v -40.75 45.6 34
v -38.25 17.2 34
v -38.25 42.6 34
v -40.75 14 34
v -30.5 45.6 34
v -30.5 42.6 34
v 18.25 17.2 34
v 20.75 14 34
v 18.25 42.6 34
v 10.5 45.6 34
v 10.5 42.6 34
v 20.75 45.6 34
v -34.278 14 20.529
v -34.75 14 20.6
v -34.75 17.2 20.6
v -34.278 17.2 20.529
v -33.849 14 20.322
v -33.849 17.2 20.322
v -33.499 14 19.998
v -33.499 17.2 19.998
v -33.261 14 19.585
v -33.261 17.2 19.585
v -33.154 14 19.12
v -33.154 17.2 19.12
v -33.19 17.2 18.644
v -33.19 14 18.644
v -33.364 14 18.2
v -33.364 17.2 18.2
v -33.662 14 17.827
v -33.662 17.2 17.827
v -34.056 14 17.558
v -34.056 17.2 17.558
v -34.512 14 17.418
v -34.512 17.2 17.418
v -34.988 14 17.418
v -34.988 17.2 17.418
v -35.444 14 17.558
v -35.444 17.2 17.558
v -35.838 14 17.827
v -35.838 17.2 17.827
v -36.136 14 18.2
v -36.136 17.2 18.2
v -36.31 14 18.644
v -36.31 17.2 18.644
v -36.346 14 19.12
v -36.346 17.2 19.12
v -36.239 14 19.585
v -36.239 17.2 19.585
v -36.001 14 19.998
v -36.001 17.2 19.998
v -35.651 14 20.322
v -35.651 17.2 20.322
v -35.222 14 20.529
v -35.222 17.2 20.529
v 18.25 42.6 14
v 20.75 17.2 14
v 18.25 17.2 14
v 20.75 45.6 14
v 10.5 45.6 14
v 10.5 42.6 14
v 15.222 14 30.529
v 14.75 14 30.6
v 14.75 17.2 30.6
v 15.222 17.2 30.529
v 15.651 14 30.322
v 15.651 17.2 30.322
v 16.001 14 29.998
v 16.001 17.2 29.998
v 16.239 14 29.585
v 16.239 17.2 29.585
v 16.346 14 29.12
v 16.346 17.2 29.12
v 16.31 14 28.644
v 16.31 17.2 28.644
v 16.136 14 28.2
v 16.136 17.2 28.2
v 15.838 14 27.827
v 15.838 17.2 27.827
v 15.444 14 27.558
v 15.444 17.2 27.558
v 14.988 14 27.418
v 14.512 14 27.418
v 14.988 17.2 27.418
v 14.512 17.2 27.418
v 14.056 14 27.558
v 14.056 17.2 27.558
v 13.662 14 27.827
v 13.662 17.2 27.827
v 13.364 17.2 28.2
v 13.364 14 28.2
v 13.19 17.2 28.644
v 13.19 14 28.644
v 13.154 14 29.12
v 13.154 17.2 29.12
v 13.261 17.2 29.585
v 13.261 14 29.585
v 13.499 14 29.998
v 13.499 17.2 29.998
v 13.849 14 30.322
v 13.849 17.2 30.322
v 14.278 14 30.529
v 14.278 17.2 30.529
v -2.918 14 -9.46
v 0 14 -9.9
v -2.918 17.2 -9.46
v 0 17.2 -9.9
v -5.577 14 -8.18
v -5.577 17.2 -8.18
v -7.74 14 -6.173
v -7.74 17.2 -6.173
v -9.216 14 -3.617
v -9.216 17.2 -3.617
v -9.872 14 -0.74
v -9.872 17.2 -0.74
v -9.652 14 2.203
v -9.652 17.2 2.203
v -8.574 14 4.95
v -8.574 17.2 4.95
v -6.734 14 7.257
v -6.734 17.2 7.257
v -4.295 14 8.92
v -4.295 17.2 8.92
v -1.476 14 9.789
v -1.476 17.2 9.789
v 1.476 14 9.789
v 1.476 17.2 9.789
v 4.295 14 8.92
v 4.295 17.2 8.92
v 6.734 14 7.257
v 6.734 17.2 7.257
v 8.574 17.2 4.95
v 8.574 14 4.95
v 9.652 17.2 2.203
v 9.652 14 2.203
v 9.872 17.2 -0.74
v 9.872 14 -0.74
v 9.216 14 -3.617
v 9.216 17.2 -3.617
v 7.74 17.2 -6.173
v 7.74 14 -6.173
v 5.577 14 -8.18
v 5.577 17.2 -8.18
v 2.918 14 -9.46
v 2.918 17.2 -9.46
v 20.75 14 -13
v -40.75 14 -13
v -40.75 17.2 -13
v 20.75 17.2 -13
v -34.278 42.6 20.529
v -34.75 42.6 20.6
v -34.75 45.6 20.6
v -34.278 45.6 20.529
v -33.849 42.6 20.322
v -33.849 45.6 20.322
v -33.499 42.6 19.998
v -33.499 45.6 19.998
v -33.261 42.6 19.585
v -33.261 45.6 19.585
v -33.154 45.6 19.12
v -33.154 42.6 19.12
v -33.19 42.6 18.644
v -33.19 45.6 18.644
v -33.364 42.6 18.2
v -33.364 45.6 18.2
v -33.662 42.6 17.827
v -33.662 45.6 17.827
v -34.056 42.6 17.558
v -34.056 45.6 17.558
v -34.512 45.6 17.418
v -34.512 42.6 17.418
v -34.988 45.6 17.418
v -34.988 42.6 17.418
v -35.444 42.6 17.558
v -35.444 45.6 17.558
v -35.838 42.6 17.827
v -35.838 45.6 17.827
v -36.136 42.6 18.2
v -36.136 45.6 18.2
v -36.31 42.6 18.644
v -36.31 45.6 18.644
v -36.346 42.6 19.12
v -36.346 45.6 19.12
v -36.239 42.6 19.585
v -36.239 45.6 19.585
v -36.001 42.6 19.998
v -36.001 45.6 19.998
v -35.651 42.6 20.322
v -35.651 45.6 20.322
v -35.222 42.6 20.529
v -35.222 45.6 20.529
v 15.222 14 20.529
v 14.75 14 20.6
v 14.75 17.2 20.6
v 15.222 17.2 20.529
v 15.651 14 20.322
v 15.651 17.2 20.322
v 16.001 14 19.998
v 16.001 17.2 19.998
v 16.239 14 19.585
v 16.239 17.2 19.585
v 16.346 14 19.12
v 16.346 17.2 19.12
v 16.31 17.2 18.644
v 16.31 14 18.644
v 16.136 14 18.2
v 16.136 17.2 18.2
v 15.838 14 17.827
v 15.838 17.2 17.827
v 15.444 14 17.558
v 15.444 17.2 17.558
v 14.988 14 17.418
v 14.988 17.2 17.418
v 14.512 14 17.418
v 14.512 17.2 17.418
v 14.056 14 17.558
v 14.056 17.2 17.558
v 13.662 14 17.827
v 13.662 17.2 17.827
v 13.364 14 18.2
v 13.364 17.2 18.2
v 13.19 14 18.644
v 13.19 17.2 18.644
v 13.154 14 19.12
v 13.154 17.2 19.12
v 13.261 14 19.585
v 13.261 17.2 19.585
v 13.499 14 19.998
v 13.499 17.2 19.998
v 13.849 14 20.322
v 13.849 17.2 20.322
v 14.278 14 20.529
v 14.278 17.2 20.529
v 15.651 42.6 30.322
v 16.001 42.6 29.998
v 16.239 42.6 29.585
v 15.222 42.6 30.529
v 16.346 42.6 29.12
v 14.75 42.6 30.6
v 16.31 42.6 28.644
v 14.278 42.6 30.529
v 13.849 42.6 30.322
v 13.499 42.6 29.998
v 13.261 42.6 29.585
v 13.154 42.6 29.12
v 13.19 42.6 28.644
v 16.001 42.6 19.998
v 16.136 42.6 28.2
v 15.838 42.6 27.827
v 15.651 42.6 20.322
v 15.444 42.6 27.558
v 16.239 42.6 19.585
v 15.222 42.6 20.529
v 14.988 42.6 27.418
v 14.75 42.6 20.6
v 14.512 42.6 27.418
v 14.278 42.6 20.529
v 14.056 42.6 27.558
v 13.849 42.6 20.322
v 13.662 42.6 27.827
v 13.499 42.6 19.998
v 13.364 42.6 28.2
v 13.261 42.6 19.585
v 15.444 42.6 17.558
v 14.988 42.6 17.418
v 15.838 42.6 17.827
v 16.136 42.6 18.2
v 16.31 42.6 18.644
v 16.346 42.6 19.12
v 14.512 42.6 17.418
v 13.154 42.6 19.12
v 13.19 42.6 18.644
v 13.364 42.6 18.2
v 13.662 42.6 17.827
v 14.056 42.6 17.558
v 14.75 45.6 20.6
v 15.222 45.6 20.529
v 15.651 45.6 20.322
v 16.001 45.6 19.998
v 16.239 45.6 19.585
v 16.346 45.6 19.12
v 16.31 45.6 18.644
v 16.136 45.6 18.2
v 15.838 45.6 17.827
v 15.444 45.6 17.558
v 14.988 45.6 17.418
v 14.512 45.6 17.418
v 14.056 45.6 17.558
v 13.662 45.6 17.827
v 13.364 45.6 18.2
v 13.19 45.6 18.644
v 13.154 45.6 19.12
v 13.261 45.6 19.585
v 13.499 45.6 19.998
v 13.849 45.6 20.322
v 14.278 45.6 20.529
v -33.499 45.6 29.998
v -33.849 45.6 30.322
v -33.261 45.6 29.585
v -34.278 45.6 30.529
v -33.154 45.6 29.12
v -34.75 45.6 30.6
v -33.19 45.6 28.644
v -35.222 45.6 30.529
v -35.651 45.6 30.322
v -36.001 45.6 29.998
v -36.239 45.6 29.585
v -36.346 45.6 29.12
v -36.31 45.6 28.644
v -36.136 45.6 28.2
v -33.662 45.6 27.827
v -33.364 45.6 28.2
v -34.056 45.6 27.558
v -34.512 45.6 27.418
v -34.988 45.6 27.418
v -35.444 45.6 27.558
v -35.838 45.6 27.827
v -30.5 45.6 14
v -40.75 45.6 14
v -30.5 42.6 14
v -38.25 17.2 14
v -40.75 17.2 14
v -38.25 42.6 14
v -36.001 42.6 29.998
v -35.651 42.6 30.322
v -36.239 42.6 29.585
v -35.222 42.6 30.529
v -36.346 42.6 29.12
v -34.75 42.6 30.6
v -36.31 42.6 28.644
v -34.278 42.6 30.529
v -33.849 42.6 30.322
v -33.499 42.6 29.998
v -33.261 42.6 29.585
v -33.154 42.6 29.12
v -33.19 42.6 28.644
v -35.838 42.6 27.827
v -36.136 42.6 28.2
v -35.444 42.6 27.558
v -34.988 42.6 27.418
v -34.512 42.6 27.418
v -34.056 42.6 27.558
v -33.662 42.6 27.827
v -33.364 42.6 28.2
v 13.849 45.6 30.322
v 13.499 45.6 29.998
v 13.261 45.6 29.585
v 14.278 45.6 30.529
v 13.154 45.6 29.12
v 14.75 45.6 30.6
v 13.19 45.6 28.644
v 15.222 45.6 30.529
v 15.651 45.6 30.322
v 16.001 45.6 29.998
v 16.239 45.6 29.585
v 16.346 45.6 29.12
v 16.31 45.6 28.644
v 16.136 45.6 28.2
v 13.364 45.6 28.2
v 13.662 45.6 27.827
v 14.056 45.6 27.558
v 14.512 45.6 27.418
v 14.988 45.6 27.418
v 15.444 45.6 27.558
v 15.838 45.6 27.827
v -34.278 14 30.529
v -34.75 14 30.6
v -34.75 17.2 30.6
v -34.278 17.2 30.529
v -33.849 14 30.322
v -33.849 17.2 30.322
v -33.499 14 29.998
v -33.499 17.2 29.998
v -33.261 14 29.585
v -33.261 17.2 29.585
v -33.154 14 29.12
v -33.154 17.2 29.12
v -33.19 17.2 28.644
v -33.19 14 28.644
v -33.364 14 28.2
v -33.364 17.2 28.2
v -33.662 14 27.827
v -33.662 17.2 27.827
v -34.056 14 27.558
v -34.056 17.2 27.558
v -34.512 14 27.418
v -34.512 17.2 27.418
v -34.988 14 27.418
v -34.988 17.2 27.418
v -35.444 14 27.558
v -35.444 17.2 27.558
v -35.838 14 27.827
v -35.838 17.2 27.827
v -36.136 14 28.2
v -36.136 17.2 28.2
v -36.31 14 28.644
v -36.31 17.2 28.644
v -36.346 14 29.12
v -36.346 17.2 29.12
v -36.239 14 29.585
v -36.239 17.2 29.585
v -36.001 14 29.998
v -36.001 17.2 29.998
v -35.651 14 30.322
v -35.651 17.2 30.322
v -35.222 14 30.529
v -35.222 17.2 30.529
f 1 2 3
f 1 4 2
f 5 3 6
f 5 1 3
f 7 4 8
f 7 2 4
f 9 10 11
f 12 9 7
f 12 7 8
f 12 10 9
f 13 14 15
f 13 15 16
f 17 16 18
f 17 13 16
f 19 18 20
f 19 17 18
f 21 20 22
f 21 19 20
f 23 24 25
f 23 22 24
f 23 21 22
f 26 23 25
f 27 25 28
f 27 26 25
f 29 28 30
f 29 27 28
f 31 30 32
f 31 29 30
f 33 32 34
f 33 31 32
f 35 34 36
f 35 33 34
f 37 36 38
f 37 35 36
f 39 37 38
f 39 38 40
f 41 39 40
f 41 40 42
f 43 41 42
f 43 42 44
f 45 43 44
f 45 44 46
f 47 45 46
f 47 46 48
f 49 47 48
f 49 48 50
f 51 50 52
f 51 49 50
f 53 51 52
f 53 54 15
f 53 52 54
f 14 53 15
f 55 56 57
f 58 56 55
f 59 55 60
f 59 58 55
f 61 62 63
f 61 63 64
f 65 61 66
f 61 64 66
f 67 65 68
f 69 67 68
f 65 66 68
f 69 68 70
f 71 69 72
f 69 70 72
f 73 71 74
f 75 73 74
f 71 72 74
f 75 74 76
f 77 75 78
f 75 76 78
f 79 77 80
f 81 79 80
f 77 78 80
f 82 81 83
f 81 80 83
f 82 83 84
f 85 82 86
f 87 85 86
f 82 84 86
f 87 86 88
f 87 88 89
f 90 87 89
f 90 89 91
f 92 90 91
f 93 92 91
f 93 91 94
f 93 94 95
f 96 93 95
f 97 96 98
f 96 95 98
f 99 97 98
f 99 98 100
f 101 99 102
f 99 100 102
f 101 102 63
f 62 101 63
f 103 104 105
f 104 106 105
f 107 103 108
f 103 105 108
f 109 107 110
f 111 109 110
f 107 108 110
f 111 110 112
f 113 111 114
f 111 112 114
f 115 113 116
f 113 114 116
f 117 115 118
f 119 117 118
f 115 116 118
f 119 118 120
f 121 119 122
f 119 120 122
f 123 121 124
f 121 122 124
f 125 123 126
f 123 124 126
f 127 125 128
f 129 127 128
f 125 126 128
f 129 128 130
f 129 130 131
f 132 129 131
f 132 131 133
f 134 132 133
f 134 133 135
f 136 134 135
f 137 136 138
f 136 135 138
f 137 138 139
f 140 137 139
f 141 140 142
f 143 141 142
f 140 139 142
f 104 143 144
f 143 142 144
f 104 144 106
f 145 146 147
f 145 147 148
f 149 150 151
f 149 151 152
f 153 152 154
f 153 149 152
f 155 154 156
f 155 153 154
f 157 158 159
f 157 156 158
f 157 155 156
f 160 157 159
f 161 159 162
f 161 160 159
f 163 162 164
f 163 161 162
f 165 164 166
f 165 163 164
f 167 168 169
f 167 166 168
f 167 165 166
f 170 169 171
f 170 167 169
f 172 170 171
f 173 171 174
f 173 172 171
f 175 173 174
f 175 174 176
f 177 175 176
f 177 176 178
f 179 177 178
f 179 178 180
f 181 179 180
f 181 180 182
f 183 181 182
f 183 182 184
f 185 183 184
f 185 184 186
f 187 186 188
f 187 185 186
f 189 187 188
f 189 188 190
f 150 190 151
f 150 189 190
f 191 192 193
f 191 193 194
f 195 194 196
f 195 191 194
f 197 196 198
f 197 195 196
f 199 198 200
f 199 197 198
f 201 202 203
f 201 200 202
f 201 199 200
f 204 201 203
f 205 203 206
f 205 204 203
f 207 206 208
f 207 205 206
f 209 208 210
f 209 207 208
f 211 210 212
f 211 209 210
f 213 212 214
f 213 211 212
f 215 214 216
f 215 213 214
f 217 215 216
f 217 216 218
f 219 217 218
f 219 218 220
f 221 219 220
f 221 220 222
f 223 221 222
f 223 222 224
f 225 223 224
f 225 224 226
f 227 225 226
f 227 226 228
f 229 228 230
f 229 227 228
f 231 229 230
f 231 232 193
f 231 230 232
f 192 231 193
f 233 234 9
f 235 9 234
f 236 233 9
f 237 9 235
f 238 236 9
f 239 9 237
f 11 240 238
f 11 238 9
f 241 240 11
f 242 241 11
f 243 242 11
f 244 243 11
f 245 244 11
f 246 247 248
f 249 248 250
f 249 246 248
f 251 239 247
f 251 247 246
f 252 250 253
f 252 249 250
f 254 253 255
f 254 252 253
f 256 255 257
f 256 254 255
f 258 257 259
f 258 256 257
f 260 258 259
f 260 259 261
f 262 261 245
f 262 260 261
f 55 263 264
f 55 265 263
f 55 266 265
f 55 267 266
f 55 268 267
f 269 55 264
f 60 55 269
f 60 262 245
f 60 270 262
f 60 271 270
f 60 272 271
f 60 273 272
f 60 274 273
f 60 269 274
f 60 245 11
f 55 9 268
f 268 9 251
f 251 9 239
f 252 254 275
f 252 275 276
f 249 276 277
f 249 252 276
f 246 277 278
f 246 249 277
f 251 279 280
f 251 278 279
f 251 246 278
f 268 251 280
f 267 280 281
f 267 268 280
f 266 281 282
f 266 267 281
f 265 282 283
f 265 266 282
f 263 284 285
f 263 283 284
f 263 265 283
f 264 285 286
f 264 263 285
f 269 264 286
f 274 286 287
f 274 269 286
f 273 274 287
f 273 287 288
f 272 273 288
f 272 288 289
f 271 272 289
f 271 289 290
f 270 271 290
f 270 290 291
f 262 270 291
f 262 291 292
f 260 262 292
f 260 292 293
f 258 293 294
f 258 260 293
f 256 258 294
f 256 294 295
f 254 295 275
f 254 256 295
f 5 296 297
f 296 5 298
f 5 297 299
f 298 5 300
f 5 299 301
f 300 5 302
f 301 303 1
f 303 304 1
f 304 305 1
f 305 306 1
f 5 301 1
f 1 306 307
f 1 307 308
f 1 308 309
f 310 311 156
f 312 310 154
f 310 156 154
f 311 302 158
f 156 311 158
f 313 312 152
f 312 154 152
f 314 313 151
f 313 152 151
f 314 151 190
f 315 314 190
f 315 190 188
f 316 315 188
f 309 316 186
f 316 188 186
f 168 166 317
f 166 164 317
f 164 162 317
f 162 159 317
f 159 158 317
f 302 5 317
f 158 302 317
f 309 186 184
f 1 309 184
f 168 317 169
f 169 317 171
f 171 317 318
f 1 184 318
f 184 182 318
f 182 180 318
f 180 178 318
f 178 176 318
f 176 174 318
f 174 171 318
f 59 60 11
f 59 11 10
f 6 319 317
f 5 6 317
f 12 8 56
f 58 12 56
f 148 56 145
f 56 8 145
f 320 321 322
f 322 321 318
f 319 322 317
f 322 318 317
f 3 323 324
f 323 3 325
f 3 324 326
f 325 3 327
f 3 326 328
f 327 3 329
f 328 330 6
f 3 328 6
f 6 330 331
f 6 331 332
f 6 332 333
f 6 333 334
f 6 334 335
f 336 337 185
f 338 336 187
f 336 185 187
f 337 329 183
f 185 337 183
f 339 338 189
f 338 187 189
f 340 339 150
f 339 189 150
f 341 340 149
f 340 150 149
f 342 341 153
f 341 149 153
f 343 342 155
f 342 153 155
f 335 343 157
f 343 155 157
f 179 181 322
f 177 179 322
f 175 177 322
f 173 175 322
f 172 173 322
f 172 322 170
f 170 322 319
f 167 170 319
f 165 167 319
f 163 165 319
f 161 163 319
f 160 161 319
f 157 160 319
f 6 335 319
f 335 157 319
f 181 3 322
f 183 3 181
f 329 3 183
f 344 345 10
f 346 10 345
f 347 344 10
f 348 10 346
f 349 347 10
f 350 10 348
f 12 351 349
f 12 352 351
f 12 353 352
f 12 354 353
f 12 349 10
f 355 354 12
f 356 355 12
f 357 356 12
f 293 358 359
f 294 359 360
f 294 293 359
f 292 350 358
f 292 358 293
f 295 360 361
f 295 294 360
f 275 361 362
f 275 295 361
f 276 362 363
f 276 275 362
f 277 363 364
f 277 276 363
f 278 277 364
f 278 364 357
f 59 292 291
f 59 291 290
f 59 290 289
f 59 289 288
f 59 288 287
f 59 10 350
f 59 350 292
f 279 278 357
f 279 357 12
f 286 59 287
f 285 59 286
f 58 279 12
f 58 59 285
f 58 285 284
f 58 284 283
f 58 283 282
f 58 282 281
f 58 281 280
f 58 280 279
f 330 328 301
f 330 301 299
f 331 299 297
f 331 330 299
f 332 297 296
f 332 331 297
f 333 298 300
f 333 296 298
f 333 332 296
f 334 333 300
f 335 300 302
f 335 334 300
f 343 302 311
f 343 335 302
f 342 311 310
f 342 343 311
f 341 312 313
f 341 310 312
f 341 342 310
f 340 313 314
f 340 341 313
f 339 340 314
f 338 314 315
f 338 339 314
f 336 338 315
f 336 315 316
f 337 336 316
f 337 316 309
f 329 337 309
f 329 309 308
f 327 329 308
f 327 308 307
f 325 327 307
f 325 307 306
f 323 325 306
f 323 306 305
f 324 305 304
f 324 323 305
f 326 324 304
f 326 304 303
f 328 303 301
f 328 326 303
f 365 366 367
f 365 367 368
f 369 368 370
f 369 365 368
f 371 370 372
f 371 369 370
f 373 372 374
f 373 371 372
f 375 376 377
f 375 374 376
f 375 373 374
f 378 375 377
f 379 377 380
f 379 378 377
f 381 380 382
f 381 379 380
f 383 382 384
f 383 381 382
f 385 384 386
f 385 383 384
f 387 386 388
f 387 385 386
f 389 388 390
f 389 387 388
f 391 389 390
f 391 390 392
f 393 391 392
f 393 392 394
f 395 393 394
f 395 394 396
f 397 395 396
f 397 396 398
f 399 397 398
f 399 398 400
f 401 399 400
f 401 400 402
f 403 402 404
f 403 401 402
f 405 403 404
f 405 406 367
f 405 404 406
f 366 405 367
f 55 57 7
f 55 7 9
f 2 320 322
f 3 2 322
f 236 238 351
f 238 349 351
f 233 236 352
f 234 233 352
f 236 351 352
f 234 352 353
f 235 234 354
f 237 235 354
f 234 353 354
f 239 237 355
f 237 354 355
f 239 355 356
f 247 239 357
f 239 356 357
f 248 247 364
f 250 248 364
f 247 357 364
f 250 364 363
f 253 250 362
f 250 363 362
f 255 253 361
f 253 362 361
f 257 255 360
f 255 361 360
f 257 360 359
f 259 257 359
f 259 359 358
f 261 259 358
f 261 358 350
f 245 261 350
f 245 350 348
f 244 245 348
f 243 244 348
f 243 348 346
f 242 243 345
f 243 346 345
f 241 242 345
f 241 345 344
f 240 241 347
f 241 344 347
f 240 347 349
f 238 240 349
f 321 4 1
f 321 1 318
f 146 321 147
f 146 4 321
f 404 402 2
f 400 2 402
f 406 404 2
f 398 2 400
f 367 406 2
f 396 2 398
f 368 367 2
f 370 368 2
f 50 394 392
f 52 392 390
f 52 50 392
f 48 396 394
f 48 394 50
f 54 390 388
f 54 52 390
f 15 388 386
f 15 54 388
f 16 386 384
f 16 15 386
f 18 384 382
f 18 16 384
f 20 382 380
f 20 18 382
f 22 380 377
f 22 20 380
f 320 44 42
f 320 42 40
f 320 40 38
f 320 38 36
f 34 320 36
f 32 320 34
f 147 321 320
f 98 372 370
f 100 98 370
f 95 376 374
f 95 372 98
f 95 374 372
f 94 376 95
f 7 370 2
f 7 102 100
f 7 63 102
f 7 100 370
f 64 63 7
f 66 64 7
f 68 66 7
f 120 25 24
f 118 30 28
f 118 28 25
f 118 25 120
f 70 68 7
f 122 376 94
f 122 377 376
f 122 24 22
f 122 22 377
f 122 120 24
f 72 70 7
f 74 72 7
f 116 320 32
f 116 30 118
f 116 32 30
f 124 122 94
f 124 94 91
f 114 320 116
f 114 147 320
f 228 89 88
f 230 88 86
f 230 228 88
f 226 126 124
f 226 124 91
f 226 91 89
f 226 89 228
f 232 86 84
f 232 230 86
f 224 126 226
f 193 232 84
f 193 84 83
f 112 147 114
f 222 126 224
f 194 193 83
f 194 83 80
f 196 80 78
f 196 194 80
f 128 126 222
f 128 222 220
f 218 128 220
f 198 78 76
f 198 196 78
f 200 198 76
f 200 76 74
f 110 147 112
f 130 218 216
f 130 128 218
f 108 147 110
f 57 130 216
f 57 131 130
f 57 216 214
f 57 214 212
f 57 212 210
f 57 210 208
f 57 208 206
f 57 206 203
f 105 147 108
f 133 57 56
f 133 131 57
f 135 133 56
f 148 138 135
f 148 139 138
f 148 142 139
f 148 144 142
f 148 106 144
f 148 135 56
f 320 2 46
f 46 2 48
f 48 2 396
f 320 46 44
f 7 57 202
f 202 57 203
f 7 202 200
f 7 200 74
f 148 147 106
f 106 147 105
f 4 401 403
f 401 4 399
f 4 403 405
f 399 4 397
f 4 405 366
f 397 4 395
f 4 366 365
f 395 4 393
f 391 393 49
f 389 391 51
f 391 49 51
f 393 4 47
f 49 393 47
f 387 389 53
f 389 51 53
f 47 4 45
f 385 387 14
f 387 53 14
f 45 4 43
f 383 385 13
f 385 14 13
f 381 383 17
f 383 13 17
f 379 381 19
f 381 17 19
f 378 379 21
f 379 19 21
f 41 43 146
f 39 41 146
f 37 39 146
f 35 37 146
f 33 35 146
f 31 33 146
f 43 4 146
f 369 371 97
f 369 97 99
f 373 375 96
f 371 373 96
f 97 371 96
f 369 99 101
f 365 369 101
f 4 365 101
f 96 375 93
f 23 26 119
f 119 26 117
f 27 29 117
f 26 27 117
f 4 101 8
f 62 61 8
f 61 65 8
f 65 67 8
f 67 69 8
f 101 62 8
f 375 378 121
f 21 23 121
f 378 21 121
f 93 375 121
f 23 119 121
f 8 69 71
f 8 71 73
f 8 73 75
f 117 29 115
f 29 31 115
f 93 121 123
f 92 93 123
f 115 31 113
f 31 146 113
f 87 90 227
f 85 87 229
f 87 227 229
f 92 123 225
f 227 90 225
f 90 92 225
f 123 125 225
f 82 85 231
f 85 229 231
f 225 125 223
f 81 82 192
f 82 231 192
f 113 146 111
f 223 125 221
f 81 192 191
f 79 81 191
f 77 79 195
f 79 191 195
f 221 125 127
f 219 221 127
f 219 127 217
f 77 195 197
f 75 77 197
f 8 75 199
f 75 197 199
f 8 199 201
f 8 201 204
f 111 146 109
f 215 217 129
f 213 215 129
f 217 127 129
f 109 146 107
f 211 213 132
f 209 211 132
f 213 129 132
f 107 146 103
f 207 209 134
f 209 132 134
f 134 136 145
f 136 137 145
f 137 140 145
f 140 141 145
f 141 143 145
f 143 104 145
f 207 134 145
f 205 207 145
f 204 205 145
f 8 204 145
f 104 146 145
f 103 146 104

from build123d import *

# Parameters (mm, degrees)
PLATE_SKETCH_W       = 61.5
PLATE_SKETCH_H       = 47
PLATE_DEPTH          = 3.2
POSTS_DEPTH          = 20
SERVO_HOLES_SKETCH_R = 1.6
SERVO_HOLES_DEPTH    = 53.1
PANEL_HOLE_SKETCH_R  = 9.9
PANEL_HOLE_DEPTH     = 18.2


with BuildPart() as part:
    # Plate Sketch → Plate (new body)
    with BuildSketch(Plane(origin=(0, 14, 0), x_dir=(1, 0, 0), z_dir=(0, 1, 0))):
        with Locations((-10, -10.5)):
            Rectangle(PLATE_SKETCH_W, PLATE_SKETCH_H)
    extrude(amount=PLATE_DEPTH)

    # Posts Sketch → Posts (add)
    with BuildSketch(Plane.XY.offset(14)):
        Polygon((-40.75, 17.2), (-38.25, 17.2), (-38.25, 42.6), (-30.5, 42.6), (-30.5, 45.6), (-40.75, 45.6), align=None)
        Polygon((20.75, 17.2), (18.25, 17.2), (18.25, 42.6), (10.5, 42.6), (10.5, 45.6), (20.75, 45.6), align=None)
    extrude(amount=POSTS_DEPTH)

    # Servo Holes Sketch → Servo Holes (cut, symmetric)
    with BuildSketch(Plane(origin=(0, 0, 0), x_dir=(1, 0, 0), z_dir=(0, 1, 0))):
        with Locations((-34.75, -19)):
            Circle(SERVO_HOLES_SKETCH_R)
        with Locations((-34.75, -29)):
            Circle(SERVO_HOLES_SKETCH_R)
        with Locations((14.75, -19)):
            Circle(SERVO_HOLES_SKETCH_R)
        with Locations((14.75, -29)):
            Circle(SERVO_HOLES_SKETCH_R)
    extrude(amount=SERVO_HOLES_DEPTH, both=True, mode=Mode.SUBTRACT)

    # Panel Hole Sketch → Panel Hole (cut, symmetric)
    with BuildSketch(Plane(origin=(0, 0, 0), x_dir=(1, 0, 0), z_dir=(0, 1, 0))):
        Circle(PANEL_HOLE_SKETCH_R)
    extrude(amount=PANEL_HOLE_DEPTH, both=True, mode=Mode.SUBTRACT)


solid = part.part
